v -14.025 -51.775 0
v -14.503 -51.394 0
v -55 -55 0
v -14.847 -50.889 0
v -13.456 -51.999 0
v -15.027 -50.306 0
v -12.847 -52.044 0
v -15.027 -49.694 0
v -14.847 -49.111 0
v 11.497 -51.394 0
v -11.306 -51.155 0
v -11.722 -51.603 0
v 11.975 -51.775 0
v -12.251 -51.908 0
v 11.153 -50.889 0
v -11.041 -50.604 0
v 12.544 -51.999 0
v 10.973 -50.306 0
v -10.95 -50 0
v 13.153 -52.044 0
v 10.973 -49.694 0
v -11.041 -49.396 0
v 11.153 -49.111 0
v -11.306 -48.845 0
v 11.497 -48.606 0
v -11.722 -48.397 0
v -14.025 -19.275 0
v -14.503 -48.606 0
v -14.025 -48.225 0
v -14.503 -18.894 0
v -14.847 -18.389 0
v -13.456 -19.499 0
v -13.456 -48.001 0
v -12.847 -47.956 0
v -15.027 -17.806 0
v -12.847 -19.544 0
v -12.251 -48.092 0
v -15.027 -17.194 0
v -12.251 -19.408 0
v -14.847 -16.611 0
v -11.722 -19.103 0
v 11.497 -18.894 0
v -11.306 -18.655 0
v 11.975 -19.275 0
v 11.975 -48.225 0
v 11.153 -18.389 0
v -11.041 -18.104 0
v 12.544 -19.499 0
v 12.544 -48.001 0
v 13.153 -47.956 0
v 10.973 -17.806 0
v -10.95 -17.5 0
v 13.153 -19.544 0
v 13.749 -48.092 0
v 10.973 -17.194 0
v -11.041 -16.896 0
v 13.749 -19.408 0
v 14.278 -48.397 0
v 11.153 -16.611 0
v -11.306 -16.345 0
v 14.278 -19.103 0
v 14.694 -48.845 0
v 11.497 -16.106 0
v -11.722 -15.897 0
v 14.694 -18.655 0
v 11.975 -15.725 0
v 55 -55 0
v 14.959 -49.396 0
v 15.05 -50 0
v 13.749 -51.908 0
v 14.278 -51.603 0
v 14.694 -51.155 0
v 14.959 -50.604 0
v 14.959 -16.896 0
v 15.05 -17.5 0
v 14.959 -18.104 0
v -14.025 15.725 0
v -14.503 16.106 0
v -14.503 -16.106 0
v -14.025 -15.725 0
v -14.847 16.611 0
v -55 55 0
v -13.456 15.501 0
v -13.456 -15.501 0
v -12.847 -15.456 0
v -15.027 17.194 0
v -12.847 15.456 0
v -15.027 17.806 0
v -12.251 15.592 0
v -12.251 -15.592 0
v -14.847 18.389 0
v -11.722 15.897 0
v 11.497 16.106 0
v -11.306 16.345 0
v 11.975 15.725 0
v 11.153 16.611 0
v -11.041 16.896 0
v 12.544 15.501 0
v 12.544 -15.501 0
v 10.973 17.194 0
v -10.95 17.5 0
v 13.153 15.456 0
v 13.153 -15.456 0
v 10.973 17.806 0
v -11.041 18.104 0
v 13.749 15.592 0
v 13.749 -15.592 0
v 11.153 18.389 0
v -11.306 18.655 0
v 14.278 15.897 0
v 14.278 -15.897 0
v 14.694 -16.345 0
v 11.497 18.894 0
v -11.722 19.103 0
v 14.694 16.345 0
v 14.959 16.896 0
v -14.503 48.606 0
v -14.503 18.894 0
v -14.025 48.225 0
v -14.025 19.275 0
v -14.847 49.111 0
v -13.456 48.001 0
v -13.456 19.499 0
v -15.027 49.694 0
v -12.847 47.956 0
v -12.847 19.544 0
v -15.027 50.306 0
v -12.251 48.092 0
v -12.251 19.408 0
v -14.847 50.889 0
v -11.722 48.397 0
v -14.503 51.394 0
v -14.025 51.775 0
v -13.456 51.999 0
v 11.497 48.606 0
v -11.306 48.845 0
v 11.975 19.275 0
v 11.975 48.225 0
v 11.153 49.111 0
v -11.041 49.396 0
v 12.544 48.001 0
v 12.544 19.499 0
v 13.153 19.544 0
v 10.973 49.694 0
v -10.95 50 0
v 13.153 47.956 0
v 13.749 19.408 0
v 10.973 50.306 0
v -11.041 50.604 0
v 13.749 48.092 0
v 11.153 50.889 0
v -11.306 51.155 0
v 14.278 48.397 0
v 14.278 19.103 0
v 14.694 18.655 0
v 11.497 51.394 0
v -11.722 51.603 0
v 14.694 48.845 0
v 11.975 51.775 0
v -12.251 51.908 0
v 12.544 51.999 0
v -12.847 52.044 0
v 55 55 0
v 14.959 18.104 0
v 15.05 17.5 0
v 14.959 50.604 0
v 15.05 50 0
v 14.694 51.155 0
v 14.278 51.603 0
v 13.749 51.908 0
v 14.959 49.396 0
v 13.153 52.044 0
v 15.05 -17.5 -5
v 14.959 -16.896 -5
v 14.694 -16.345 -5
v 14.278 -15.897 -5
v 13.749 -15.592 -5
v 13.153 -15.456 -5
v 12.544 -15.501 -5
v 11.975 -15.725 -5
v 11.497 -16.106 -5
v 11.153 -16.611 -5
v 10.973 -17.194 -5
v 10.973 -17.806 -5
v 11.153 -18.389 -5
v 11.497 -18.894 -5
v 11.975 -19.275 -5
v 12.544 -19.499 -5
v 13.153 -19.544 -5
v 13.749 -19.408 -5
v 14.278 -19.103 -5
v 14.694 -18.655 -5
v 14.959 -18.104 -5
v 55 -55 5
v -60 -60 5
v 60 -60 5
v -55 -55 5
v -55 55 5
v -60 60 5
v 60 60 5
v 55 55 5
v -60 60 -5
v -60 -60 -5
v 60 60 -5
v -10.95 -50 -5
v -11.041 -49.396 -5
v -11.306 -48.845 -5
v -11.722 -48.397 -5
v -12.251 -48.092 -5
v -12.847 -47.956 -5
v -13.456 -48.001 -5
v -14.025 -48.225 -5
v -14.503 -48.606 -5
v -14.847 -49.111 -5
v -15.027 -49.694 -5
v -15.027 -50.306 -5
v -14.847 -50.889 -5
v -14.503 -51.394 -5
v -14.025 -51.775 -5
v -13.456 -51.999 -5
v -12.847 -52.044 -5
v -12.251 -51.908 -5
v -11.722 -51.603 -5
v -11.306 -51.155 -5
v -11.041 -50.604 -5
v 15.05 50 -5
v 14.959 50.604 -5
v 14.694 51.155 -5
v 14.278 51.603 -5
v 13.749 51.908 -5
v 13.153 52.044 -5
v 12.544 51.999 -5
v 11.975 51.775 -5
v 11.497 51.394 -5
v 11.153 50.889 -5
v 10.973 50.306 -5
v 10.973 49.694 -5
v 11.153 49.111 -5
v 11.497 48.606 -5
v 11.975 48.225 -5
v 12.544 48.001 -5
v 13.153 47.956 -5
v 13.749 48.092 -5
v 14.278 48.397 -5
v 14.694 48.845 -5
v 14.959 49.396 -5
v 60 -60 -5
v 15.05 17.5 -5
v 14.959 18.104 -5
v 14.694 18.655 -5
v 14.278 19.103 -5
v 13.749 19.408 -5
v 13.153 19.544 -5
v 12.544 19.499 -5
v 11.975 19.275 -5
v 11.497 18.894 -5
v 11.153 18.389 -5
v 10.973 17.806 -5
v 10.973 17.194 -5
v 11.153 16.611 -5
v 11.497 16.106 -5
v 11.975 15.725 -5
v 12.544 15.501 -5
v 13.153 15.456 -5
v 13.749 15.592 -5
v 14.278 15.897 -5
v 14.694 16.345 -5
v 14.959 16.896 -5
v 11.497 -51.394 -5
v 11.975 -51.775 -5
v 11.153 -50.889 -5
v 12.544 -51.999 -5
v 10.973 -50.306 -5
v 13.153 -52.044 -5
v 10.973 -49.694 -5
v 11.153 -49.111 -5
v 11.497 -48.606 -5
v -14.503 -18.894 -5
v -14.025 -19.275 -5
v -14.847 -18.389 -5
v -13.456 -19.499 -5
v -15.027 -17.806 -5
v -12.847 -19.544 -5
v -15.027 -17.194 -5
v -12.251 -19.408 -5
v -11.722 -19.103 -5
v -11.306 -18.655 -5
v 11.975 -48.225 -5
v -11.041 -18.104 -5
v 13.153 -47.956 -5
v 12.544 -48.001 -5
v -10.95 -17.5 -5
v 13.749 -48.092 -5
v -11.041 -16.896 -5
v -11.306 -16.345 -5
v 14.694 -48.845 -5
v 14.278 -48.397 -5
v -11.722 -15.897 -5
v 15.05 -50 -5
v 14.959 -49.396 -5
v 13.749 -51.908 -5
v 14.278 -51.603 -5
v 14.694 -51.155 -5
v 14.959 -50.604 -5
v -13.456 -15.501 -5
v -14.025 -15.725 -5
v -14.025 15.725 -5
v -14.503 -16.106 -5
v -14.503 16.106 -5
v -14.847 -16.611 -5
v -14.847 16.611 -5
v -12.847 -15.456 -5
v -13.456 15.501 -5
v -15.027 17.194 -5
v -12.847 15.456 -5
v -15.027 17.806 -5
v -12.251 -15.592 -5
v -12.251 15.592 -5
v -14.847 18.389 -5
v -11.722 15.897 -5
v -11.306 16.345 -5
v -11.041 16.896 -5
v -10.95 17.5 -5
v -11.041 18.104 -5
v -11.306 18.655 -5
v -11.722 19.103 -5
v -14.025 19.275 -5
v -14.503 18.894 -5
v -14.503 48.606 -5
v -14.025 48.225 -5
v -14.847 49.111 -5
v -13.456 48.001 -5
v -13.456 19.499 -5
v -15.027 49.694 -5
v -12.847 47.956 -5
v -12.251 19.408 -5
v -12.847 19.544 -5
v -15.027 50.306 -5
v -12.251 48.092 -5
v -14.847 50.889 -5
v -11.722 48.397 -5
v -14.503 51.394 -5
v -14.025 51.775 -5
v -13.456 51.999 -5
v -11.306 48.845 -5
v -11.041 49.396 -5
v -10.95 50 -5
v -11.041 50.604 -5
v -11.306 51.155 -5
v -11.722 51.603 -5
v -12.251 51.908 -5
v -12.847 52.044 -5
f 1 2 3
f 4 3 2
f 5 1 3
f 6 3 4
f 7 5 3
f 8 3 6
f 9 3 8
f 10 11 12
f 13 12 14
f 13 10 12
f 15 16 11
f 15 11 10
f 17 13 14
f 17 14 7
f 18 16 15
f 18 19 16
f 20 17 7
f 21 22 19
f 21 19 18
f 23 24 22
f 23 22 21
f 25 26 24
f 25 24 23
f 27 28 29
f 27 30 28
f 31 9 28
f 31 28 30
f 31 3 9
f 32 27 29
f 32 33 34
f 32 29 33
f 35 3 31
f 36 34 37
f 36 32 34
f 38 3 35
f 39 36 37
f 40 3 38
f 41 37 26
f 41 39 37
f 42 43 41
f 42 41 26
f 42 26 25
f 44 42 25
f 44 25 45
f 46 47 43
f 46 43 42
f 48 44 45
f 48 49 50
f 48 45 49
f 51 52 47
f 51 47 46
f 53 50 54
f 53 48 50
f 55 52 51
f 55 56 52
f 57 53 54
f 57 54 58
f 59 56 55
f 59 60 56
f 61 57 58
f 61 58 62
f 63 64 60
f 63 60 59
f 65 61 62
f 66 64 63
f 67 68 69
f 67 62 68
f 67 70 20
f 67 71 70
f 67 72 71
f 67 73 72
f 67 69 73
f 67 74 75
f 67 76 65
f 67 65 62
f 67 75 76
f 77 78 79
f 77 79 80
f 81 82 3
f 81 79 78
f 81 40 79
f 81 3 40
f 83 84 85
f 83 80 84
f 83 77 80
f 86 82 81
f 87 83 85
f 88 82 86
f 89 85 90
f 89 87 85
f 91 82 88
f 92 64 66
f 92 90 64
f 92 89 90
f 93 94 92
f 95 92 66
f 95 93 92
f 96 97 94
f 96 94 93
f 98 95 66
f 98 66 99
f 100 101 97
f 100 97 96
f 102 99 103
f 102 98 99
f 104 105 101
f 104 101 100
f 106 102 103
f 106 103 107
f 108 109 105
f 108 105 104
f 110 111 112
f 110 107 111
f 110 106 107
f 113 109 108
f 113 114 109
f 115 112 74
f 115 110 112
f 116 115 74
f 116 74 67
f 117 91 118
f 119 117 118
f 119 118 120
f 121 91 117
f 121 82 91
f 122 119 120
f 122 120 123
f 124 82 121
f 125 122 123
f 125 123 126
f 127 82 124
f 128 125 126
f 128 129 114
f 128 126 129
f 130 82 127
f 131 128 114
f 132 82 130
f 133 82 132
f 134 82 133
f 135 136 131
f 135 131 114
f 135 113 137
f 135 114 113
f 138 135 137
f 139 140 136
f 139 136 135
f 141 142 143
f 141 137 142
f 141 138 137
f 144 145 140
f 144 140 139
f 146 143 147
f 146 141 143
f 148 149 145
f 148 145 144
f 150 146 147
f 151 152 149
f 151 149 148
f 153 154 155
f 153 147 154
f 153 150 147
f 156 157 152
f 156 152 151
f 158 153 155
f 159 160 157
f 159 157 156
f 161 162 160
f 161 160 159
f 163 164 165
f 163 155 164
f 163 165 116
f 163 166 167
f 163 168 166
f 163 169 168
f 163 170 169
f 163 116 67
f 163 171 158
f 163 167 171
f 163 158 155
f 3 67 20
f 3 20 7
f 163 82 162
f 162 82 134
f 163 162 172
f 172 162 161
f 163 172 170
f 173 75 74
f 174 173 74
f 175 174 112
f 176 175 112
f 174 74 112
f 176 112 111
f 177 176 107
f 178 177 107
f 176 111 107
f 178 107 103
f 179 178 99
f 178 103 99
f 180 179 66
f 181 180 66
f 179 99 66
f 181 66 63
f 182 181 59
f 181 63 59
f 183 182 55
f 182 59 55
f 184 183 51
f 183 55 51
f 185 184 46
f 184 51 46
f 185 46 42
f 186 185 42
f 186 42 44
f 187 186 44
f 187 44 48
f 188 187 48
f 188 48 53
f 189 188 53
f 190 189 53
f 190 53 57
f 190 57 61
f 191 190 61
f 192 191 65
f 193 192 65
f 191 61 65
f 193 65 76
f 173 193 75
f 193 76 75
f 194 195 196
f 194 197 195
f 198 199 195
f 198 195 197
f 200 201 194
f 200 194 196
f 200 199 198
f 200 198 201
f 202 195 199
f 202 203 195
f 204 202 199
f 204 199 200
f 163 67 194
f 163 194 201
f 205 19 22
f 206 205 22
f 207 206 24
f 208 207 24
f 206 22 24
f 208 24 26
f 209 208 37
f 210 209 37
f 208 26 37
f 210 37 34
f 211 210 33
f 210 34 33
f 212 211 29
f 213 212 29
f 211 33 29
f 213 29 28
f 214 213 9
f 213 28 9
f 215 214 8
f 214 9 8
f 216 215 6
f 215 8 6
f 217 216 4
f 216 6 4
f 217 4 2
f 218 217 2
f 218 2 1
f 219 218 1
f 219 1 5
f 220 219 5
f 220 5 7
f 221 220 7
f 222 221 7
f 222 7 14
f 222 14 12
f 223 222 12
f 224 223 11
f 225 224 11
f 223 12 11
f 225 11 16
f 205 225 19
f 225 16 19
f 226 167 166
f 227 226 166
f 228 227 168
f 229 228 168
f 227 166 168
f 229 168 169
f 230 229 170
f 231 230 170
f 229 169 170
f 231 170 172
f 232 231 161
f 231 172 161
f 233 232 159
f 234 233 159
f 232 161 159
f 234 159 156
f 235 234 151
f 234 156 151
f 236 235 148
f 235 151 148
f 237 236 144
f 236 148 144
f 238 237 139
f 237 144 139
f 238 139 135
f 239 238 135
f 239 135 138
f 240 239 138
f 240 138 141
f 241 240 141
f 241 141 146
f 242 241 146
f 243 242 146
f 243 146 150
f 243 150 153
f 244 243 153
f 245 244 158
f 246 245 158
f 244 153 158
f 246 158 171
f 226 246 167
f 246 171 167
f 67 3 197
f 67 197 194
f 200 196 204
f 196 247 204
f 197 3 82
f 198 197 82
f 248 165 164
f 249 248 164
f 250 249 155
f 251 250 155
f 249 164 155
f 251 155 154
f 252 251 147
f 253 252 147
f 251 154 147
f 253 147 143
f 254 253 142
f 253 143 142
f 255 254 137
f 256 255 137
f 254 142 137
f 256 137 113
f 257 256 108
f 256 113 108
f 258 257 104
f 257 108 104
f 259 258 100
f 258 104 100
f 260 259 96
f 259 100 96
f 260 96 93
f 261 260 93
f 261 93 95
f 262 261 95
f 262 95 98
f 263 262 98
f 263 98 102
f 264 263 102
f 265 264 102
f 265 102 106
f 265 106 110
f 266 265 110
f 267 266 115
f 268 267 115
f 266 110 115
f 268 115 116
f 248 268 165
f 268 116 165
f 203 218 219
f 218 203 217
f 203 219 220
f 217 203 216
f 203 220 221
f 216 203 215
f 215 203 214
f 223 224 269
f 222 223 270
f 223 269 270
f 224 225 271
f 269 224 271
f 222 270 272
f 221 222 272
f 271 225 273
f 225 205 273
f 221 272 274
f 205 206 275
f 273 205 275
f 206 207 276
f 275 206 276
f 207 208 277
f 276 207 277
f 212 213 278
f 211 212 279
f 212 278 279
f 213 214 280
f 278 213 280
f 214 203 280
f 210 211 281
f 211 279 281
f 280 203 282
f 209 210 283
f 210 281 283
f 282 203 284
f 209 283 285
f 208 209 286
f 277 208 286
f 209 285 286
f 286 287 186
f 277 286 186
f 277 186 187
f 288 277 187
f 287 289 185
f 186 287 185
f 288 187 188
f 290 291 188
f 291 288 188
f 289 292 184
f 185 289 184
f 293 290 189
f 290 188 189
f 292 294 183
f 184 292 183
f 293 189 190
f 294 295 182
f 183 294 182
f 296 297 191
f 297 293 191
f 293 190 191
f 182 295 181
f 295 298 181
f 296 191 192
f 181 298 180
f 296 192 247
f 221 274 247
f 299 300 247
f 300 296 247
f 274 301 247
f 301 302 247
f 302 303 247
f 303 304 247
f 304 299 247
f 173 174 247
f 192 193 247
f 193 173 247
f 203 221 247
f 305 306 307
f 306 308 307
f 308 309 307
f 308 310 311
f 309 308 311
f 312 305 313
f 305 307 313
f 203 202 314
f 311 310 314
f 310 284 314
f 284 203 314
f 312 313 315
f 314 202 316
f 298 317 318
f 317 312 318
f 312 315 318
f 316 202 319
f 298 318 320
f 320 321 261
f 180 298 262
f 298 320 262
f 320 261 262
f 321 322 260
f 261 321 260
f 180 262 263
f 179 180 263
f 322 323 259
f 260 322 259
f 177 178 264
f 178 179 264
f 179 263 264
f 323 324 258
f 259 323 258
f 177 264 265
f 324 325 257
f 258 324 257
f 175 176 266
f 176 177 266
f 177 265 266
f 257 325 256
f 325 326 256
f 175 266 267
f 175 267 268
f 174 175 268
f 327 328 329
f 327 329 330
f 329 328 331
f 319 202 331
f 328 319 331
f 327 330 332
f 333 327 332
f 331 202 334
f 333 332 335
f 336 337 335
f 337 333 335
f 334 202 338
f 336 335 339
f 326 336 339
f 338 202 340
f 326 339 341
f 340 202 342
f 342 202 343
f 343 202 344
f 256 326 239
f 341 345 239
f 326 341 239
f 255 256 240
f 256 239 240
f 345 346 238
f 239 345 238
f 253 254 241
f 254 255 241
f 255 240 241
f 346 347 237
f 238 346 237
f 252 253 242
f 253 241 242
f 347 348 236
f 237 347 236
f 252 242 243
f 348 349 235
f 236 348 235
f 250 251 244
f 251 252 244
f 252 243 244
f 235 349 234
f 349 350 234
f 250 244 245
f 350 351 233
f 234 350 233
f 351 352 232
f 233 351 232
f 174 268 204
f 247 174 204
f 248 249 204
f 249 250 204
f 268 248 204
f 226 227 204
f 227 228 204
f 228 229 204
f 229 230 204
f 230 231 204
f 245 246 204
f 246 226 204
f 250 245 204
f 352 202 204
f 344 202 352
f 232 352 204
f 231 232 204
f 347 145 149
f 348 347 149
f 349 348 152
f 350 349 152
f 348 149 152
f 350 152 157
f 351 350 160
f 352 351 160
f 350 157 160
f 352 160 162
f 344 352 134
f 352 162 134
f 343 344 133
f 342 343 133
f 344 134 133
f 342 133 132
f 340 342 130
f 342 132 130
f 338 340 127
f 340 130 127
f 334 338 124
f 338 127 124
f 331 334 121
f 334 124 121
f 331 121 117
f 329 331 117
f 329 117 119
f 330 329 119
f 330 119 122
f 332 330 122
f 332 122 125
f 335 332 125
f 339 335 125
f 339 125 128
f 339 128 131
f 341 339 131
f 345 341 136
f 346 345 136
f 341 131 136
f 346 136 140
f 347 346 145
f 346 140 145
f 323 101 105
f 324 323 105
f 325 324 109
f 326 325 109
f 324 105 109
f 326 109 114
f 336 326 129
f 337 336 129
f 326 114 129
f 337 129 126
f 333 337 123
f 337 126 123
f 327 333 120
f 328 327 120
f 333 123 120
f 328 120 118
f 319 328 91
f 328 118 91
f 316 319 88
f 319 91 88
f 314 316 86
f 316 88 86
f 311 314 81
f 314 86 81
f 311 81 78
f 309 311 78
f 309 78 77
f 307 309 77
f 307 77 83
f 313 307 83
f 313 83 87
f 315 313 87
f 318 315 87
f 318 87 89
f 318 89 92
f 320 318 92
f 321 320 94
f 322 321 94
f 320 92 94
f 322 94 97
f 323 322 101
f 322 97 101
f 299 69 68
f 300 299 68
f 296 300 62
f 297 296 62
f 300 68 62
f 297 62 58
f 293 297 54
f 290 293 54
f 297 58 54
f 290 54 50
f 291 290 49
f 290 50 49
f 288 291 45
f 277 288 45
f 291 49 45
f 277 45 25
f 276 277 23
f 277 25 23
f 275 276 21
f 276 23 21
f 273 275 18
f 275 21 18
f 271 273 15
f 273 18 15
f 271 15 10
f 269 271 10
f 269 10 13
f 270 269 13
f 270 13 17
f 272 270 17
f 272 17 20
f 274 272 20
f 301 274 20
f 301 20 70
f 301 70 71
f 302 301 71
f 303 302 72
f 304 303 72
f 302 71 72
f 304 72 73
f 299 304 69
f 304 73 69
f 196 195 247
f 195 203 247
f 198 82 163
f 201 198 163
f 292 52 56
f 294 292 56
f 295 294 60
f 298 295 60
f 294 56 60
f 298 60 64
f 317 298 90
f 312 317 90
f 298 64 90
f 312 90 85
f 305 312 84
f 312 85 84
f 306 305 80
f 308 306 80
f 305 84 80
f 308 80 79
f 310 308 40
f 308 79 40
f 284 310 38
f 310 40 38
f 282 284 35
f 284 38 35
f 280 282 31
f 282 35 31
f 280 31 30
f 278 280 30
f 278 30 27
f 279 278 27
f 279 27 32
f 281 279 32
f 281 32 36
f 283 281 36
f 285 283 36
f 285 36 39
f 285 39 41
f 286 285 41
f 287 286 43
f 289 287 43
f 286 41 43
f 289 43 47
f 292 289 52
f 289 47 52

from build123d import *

# Parameters (mm, degrees)
F0_W     = 120
F0_H     = 120
F0_R     = 2.05
F1_DEPTH = 5
F2_W     = 120
F2_H     = 120
F2_W_2   = 110
F2_H_2   = 110
F3_DEPTH = 5


with BuildPart() as f1:
    # F0 (on Top) → F1 (new body)
    with BuildSketch(Plane.XY):
        Rectangle(F0_W, F0_H)
        with Locations((-13, -50)):
            Circle(F0_R, mode=Mode.SUBTRACT)
        with Locations((-13, -17.5)):
            Circle(F0_R, mode=Mode.SUBTRACT)
        with Locations((13, -50)):
            Circle(F0_R, mode=Mode.SUBTRACT)
        with Locations((13, -17.5)):
            Circle(F0_R, mode=Mode.SUBTRACT)
        with Locations((-13, 17.5)):
            Circle(F0_R, mode=Mode.SUBTRACT)
        with Locations((-13, 50)):
            Circle(F0_R, mode=Mode.SUBTRACT)
        with Locations((13, 17.5)):
            Circle(F0_R, mode=Mode.SUBTRACT)
        with Locations((13, 50)):
            Circle(F0_R, mode=Mode.SUBTRACT)
    extrude(amount=-F1_DEPTH)

    # F2 (on Top) → F3 (join)
    with BuildSketch(Plane.XY):
        Rectangle(F2_W, F2_H)
        Rectangle(F2_W_2, F2_H_2, mode=Mode.SUBTRACT)
    extrude(amount=F3_DEPTH)


solid = f1.part
